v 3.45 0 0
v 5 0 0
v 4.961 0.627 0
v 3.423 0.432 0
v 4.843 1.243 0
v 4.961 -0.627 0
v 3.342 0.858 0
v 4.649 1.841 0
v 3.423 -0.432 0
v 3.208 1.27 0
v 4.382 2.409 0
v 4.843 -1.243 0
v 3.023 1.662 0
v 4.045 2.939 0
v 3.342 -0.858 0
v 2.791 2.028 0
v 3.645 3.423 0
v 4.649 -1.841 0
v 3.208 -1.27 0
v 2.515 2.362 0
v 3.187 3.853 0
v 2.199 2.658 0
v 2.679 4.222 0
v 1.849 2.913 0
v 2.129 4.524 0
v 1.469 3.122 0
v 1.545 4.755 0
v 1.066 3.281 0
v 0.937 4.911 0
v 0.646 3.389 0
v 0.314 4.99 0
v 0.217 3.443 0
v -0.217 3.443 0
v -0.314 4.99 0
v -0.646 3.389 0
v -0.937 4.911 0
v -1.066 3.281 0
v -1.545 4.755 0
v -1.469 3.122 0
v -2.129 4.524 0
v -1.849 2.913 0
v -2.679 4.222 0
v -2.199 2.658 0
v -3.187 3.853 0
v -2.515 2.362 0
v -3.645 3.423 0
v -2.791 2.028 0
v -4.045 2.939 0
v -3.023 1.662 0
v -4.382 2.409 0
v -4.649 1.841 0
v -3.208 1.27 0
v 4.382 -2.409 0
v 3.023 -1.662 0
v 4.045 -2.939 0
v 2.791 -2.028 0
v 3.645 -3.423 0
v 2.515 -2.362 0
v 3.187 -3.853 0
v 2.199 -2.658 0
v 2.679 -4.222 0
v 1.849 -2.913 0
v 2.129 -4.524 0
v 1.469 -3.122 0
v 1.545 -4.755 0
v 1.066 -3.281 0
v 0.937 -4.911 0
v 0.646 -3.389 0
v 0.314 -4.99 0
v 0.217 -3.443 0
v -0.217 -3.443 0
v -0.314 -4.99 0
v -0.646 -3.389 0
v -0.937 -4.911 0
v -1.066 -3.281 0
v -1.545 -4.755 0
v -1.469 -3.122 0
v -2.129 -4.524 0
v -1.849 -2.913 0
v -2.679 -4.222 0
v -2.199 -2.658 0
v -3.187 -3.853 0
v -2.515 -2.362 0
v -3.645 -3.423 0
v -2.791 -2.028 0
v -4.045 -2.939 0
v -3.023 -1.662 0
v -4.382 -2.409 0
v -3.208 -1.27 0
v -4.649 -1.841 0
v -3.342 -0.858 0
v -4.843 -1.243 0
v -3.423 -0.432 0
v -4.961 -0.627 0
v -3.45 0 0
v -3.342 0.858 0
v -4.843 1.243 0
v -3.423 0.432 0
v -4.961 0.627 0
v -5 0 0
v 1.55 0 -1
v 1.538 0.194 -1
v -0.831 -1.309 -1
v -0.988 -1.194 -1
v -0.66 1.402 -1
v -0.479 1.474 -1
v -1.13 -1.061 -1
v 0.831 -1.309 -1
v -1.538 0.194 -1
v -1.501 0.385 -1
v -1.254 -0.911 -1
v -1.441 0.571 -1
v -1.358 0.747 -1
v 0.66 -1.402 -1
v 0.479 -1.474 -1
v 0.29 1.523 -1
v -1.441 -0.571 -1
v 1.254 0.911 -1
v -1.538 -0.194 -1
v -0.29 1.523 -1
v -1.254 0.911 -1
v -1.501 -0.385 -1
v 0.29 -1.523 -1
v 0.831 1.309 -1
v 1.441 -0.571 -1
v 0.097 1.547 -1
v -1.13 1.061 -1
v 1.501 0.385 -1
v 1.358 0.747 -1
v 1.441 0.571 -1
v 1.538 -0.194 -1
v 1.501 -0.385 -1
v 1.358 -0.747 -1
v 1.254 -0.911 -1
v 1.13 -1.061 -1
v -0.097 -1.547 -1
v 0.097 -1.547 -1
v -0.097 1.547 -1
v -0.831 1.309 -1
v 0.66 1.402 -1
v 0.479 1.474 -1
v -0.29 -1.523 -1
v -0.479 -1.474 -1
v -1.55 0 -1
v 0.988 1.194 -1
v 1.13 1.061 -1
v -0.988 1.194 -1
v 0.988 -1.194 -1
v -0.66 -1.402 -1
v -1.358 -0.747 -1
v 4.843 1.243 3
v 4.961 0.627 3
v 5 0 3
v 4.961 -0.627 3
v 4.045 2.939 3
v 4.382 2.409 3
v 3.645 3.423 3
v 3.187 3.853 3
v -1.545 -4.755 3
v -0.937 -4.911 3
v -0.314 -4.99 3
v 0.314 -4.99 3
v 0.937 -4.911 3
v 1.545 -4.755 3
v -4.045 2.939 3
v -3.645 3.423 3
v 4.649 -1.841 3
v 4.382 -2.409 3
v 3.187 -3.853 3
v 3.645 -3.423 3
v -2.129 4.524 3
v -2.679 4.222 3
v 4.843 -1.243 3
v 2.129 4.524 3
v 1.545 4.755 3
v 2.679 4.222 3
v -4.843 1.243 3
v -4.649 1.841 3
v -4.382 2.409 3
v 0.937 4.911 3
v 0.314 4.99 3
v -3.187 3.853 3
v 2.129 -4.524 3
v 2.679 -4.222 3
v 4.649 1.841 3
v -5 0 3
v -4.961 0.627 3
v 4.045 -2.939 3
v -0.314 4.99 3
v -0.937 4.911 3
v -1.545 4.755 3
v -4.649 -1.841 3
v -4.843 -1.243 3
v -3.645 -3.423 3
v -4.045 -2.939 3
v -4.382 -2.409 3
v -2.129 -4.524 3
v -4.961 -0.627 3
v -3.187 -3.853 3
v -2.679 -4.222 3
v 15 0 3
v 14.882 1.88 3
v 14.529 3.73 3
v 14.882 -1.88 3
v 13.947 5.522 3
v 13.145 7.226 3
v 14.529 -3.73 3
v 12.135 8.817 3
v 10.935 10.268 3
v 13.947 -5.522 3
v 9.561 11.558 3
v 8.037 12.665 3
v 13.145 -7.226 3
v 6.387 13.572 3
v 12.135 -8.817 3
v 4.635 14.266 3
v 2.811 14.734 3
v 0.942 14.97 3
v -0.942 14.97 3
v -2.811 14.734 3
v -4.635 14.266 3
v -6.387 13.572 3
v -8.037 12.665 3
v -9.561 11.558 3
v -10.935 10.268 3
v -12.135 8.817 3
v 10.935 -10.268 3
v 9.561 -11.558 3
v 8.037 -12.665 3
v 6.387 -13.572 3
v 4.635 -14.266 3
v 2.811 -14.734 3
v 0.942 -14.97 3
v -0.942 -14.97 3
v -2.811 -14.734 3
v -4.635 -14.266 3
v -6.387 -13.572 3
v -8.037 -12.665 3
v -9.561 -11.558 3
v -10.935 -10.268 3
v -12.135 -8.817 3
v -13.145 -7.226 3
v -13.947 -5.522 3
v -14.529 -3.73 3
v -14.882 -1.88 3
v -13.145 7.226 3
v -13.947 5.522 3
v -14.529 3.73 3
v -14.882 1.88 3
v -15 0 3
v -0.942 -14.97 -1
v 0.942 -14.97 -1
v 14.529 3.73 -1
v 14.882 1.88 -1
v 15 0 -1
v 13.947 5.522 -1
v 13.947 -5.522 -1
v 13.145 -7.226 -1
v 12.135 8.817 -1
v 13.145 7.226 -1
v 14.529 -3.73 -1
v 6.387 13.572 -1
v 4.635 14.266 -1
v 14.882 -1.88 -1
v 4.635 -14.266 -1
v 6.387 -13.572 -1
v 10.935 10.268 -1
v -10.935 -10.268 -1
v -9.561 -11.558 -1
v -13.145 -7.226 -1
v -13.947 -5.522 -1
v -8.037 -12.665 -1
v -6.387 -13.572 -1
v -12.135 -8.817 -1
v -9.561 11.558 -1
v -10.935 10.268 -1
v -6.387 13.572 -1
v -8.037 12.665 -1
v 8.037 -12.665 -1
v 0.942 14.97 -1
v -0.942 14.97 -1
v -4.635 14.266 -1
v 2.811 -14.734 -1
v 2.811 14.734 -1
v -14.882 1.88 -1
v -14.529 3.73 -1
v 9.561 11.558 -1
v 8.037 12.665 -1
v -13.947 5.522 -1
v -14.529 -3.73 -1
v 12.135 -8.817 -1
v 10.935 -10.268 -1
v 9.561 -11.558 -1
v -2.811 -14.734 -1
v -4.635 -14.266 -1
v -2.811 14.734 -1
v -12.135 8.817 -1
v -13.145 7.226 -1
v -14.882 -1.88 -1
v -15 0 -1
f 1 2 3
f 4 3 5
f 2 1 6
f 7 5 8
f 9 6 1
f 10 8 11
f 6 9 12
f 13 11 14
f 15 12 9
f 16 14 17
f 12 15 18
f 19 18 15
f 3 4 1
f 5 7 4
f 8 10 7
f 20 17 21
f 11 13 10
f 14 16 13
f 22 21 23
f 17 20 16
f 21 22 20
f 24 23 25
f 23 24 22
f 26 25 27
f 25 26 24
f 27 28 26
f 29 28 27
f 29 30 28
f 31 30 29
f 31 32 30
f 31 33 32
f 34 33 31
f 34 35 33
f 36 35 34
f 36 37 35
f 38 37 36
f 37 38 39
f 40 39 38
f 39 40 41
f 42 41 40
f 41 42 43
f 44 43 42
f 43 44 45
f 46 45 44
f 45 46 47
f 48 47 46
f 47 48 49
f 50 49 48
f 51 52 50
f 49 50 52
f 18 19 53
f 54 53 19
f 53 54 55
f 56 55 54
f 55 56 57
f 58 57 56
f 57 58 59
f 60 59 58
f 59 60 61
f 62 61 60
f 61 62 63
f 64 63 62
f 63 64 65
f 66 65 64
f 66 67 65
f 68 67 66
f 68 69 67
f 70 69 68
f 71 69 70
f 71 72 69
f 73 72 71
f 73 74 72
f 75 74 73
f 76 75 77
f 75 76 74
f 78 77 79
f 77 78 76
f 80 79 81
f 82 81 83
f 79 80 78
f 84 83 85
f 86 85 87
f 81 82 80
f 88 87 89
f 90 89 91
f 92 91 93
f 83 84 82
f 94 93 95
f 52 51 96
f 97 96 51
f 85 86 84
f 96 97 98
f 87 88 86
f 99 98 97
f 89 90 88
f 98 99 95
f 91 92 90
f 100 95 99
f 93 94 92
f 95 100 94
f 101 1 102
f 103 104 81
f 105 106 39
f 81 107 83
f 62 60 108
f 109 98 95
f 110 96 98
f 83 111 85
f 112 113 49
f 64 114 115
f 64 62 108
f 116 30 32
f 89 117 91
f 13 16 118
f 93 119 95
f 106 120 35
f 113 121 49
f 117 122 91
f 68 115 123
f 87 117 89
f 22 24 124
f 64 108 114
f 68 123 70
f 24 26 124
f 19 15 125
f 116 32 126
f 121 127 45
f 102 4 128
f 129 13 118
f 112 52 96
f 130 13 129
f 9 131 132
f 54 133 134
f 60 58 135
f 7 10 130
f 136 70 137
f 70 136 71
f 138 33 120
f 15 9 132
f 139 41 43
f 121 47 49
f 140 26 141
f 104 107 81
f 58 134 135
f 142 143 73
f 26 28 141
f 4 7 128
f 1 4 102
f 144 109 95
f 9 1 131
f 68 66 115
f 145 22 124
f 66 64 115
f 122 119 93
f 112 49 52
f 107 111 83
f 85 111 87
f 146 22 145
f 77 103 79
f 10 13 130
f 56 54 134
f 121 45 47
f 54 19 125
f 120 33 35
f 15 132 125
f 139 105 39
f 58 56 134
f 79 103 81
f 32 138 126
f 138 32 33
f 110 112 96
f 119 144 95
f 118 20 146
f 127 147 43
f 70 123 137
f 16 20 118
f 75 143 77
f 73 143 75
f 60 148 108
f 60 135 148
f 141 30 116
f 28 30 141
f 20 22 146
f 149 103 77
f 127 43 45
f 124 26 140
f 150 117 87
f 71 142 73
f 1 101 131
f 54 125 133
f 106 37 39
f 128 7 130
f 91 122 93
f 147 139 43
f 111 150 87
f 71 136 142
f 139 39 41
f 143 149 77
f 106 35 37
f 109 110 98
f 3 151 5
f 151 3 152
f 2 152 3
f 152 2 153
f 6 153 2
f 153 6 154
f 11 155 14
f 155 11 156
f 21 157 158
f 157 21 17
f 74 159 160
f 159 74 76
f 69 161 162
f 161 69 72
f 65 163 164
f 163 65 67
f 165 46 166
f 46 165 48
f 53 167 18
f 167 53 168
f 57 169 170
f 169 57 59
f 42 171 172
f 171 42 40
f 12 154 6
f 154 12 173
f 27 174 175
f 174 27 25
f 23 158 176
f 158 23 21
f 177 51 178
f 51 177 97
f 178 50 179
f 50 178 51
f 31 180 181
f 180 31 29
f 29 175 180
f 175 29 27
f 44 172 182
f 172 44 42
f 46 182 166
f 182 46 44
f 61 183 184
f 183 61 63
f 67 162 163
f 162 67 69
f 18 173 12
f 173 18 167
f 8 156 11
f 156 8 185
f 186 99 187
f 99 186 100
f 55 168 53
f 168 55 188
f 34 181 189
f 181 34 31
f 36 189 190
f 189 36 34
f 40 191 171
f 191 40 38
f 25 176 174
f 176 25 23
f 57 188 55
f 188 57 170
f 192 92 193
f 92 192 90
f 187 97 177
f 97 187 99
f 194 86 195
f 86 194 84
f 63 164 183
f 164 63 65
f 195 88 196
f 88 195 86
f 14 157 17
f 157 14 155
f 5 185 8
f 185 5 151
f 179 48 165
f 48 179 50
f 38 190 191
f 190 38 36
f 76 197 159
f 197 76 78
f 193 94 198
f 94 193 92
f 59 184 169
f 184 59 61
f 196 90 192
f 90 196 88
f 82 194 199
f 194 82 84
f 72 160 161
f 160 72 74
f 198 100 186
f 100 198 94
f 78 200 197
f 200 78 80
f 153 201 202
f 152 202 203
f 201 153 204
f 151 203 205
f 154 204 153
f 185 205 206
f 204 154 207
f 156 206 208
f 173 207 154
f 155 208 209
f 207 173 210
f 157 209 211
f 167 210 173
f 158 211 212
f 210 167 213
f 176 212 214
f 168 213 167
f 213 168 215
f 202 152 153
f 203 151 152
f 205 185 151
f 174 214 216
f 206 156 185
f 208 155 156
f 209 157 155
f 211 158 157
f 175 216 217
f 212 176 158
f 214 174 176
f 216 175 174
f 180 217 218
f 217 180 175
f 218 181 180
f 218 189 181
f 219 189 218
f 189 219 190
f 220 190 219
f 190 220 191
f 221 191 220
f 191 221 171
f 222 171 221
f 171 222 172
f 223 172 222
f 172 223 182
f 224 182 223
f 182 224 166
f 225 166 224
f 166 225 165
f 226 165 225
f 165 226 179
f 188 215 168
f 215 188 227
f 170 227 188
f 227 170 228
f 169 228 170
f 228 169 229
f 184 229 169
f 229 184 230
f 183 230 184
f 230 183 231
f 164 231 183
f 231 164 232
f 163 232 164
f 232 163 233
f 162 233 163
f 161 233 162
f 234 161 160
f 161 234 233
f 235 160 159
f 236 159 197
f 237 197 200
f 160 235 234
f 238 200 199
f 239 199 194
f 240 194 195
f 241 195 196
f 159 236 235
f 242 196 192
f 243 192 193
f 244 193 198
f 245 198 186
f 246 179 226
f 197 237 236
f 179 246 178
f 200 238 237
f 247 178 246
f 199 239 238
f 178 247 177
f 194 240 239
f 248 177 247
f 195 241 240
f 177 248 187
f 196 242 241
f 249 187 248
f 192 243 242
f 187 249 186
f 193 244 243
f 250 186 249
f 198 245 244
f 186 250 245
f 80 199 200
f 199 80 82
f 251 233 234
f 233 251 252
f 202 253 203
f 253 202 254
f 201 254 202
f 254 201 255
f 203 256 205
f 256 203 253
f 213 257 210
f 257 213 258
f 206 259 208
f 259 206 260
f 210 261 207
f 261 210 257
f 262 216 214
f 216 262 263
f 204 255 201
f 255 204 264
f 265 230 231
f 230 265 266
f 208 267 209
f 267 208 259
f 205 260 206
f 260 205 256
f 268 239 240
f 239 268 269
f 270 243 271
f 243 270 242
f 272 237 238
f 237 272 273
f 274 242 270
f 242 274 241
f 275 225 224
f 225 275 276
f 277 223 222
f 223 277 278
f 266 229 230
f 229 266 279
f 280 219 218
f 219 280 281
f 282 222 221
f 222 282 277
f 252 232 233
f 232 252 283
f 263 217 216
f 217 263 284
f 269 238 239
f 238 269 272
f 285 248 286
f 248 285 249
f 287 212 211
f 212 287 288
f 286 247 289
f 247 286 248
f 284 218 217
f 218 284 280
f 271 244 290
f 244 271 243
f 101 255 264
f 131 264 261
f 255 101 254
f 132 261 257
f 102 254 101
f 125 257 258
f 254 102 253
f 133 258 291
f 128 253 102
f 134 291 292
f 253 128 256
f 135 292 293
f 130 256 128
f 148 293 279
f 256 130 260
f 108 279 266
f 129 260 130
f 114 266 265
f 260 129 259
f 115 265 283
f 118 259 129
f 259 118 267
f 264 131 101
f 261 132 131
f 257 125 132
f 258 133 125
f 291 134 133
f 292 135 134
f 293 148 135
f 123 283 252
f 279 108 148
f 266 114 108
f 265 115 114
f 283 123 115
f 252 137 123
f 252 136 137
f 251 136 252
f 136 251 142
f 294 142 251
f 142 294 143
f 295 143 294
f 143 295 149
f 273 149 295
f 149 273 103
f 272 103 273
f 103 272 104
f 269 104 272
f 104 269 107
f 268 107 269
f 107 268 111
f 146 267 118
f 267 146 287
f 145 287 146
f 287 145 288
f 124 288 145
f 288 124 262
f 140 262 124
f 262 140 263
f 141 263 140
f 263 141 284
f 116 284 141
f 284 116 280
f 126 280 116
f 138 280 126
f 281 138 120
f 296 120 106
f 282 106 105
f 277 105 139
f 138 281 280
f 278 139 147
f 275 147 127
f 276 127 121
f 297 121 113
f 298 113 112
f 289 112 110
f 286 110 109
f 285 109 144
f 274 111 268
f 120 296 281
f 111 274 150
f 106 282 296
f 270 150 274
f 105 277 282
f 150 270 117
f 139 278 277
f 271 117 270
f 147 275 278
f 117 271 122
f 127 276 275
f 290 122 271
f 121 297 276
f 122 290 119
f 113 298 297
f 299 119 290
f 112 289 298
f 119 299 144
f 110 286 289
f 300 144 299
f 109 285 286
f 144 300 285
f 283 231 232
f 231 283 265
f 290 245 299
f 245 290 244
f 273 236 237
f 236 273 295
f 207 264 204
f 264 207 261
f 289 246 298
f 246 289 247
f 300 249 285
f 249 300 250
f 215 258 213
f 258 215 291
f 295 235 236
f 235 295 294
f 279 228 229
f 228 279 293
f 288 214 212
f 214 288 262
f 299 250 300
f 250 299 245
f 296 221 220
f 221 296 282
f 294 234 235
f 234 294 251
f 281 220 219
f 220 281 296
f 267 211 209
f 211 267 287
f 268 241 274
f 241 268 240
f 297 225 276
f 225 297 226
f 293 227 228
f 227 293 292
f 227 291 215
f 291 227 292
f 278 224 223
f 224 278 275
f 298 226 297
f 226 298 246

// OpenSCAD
$fn = 50;


difference() {
	union() {
		translate(v = [0, 0, -1.0000000000]) {
			cylinder(h = 4.0000000000, r = 15.0000000000);
		}
	}
	union() {
		translate(v = [0, 0, 0]) {
			rotate(a = [0, 0, 0]) {
				difference() {
					union() {
						translate(v = [0, 0, -4.0000000000]) {
							cylinder(h = 4.0000000000, r = 1.2500000000);
						}
						translate(v = [0, 0, -1.0000000000]) {
							cylinder(h = 1.0000000000, r1 = 1.5500000000, r2 = 3.4500000000);
						}
						translate(v = [0, 0, -4.0000000000]) {
							cylinder(h = 4.0000000000, r = 1.5500000000);
						}
						translate(v = [0, 0, -4.0000000000]) {
							cylinder(h = 4.0000000000, r = 1.2500000000);
						}
					}
					union();
				}
			}
		}
		#cylinder(h = 3, r = 5.0000000000);
	}
}
